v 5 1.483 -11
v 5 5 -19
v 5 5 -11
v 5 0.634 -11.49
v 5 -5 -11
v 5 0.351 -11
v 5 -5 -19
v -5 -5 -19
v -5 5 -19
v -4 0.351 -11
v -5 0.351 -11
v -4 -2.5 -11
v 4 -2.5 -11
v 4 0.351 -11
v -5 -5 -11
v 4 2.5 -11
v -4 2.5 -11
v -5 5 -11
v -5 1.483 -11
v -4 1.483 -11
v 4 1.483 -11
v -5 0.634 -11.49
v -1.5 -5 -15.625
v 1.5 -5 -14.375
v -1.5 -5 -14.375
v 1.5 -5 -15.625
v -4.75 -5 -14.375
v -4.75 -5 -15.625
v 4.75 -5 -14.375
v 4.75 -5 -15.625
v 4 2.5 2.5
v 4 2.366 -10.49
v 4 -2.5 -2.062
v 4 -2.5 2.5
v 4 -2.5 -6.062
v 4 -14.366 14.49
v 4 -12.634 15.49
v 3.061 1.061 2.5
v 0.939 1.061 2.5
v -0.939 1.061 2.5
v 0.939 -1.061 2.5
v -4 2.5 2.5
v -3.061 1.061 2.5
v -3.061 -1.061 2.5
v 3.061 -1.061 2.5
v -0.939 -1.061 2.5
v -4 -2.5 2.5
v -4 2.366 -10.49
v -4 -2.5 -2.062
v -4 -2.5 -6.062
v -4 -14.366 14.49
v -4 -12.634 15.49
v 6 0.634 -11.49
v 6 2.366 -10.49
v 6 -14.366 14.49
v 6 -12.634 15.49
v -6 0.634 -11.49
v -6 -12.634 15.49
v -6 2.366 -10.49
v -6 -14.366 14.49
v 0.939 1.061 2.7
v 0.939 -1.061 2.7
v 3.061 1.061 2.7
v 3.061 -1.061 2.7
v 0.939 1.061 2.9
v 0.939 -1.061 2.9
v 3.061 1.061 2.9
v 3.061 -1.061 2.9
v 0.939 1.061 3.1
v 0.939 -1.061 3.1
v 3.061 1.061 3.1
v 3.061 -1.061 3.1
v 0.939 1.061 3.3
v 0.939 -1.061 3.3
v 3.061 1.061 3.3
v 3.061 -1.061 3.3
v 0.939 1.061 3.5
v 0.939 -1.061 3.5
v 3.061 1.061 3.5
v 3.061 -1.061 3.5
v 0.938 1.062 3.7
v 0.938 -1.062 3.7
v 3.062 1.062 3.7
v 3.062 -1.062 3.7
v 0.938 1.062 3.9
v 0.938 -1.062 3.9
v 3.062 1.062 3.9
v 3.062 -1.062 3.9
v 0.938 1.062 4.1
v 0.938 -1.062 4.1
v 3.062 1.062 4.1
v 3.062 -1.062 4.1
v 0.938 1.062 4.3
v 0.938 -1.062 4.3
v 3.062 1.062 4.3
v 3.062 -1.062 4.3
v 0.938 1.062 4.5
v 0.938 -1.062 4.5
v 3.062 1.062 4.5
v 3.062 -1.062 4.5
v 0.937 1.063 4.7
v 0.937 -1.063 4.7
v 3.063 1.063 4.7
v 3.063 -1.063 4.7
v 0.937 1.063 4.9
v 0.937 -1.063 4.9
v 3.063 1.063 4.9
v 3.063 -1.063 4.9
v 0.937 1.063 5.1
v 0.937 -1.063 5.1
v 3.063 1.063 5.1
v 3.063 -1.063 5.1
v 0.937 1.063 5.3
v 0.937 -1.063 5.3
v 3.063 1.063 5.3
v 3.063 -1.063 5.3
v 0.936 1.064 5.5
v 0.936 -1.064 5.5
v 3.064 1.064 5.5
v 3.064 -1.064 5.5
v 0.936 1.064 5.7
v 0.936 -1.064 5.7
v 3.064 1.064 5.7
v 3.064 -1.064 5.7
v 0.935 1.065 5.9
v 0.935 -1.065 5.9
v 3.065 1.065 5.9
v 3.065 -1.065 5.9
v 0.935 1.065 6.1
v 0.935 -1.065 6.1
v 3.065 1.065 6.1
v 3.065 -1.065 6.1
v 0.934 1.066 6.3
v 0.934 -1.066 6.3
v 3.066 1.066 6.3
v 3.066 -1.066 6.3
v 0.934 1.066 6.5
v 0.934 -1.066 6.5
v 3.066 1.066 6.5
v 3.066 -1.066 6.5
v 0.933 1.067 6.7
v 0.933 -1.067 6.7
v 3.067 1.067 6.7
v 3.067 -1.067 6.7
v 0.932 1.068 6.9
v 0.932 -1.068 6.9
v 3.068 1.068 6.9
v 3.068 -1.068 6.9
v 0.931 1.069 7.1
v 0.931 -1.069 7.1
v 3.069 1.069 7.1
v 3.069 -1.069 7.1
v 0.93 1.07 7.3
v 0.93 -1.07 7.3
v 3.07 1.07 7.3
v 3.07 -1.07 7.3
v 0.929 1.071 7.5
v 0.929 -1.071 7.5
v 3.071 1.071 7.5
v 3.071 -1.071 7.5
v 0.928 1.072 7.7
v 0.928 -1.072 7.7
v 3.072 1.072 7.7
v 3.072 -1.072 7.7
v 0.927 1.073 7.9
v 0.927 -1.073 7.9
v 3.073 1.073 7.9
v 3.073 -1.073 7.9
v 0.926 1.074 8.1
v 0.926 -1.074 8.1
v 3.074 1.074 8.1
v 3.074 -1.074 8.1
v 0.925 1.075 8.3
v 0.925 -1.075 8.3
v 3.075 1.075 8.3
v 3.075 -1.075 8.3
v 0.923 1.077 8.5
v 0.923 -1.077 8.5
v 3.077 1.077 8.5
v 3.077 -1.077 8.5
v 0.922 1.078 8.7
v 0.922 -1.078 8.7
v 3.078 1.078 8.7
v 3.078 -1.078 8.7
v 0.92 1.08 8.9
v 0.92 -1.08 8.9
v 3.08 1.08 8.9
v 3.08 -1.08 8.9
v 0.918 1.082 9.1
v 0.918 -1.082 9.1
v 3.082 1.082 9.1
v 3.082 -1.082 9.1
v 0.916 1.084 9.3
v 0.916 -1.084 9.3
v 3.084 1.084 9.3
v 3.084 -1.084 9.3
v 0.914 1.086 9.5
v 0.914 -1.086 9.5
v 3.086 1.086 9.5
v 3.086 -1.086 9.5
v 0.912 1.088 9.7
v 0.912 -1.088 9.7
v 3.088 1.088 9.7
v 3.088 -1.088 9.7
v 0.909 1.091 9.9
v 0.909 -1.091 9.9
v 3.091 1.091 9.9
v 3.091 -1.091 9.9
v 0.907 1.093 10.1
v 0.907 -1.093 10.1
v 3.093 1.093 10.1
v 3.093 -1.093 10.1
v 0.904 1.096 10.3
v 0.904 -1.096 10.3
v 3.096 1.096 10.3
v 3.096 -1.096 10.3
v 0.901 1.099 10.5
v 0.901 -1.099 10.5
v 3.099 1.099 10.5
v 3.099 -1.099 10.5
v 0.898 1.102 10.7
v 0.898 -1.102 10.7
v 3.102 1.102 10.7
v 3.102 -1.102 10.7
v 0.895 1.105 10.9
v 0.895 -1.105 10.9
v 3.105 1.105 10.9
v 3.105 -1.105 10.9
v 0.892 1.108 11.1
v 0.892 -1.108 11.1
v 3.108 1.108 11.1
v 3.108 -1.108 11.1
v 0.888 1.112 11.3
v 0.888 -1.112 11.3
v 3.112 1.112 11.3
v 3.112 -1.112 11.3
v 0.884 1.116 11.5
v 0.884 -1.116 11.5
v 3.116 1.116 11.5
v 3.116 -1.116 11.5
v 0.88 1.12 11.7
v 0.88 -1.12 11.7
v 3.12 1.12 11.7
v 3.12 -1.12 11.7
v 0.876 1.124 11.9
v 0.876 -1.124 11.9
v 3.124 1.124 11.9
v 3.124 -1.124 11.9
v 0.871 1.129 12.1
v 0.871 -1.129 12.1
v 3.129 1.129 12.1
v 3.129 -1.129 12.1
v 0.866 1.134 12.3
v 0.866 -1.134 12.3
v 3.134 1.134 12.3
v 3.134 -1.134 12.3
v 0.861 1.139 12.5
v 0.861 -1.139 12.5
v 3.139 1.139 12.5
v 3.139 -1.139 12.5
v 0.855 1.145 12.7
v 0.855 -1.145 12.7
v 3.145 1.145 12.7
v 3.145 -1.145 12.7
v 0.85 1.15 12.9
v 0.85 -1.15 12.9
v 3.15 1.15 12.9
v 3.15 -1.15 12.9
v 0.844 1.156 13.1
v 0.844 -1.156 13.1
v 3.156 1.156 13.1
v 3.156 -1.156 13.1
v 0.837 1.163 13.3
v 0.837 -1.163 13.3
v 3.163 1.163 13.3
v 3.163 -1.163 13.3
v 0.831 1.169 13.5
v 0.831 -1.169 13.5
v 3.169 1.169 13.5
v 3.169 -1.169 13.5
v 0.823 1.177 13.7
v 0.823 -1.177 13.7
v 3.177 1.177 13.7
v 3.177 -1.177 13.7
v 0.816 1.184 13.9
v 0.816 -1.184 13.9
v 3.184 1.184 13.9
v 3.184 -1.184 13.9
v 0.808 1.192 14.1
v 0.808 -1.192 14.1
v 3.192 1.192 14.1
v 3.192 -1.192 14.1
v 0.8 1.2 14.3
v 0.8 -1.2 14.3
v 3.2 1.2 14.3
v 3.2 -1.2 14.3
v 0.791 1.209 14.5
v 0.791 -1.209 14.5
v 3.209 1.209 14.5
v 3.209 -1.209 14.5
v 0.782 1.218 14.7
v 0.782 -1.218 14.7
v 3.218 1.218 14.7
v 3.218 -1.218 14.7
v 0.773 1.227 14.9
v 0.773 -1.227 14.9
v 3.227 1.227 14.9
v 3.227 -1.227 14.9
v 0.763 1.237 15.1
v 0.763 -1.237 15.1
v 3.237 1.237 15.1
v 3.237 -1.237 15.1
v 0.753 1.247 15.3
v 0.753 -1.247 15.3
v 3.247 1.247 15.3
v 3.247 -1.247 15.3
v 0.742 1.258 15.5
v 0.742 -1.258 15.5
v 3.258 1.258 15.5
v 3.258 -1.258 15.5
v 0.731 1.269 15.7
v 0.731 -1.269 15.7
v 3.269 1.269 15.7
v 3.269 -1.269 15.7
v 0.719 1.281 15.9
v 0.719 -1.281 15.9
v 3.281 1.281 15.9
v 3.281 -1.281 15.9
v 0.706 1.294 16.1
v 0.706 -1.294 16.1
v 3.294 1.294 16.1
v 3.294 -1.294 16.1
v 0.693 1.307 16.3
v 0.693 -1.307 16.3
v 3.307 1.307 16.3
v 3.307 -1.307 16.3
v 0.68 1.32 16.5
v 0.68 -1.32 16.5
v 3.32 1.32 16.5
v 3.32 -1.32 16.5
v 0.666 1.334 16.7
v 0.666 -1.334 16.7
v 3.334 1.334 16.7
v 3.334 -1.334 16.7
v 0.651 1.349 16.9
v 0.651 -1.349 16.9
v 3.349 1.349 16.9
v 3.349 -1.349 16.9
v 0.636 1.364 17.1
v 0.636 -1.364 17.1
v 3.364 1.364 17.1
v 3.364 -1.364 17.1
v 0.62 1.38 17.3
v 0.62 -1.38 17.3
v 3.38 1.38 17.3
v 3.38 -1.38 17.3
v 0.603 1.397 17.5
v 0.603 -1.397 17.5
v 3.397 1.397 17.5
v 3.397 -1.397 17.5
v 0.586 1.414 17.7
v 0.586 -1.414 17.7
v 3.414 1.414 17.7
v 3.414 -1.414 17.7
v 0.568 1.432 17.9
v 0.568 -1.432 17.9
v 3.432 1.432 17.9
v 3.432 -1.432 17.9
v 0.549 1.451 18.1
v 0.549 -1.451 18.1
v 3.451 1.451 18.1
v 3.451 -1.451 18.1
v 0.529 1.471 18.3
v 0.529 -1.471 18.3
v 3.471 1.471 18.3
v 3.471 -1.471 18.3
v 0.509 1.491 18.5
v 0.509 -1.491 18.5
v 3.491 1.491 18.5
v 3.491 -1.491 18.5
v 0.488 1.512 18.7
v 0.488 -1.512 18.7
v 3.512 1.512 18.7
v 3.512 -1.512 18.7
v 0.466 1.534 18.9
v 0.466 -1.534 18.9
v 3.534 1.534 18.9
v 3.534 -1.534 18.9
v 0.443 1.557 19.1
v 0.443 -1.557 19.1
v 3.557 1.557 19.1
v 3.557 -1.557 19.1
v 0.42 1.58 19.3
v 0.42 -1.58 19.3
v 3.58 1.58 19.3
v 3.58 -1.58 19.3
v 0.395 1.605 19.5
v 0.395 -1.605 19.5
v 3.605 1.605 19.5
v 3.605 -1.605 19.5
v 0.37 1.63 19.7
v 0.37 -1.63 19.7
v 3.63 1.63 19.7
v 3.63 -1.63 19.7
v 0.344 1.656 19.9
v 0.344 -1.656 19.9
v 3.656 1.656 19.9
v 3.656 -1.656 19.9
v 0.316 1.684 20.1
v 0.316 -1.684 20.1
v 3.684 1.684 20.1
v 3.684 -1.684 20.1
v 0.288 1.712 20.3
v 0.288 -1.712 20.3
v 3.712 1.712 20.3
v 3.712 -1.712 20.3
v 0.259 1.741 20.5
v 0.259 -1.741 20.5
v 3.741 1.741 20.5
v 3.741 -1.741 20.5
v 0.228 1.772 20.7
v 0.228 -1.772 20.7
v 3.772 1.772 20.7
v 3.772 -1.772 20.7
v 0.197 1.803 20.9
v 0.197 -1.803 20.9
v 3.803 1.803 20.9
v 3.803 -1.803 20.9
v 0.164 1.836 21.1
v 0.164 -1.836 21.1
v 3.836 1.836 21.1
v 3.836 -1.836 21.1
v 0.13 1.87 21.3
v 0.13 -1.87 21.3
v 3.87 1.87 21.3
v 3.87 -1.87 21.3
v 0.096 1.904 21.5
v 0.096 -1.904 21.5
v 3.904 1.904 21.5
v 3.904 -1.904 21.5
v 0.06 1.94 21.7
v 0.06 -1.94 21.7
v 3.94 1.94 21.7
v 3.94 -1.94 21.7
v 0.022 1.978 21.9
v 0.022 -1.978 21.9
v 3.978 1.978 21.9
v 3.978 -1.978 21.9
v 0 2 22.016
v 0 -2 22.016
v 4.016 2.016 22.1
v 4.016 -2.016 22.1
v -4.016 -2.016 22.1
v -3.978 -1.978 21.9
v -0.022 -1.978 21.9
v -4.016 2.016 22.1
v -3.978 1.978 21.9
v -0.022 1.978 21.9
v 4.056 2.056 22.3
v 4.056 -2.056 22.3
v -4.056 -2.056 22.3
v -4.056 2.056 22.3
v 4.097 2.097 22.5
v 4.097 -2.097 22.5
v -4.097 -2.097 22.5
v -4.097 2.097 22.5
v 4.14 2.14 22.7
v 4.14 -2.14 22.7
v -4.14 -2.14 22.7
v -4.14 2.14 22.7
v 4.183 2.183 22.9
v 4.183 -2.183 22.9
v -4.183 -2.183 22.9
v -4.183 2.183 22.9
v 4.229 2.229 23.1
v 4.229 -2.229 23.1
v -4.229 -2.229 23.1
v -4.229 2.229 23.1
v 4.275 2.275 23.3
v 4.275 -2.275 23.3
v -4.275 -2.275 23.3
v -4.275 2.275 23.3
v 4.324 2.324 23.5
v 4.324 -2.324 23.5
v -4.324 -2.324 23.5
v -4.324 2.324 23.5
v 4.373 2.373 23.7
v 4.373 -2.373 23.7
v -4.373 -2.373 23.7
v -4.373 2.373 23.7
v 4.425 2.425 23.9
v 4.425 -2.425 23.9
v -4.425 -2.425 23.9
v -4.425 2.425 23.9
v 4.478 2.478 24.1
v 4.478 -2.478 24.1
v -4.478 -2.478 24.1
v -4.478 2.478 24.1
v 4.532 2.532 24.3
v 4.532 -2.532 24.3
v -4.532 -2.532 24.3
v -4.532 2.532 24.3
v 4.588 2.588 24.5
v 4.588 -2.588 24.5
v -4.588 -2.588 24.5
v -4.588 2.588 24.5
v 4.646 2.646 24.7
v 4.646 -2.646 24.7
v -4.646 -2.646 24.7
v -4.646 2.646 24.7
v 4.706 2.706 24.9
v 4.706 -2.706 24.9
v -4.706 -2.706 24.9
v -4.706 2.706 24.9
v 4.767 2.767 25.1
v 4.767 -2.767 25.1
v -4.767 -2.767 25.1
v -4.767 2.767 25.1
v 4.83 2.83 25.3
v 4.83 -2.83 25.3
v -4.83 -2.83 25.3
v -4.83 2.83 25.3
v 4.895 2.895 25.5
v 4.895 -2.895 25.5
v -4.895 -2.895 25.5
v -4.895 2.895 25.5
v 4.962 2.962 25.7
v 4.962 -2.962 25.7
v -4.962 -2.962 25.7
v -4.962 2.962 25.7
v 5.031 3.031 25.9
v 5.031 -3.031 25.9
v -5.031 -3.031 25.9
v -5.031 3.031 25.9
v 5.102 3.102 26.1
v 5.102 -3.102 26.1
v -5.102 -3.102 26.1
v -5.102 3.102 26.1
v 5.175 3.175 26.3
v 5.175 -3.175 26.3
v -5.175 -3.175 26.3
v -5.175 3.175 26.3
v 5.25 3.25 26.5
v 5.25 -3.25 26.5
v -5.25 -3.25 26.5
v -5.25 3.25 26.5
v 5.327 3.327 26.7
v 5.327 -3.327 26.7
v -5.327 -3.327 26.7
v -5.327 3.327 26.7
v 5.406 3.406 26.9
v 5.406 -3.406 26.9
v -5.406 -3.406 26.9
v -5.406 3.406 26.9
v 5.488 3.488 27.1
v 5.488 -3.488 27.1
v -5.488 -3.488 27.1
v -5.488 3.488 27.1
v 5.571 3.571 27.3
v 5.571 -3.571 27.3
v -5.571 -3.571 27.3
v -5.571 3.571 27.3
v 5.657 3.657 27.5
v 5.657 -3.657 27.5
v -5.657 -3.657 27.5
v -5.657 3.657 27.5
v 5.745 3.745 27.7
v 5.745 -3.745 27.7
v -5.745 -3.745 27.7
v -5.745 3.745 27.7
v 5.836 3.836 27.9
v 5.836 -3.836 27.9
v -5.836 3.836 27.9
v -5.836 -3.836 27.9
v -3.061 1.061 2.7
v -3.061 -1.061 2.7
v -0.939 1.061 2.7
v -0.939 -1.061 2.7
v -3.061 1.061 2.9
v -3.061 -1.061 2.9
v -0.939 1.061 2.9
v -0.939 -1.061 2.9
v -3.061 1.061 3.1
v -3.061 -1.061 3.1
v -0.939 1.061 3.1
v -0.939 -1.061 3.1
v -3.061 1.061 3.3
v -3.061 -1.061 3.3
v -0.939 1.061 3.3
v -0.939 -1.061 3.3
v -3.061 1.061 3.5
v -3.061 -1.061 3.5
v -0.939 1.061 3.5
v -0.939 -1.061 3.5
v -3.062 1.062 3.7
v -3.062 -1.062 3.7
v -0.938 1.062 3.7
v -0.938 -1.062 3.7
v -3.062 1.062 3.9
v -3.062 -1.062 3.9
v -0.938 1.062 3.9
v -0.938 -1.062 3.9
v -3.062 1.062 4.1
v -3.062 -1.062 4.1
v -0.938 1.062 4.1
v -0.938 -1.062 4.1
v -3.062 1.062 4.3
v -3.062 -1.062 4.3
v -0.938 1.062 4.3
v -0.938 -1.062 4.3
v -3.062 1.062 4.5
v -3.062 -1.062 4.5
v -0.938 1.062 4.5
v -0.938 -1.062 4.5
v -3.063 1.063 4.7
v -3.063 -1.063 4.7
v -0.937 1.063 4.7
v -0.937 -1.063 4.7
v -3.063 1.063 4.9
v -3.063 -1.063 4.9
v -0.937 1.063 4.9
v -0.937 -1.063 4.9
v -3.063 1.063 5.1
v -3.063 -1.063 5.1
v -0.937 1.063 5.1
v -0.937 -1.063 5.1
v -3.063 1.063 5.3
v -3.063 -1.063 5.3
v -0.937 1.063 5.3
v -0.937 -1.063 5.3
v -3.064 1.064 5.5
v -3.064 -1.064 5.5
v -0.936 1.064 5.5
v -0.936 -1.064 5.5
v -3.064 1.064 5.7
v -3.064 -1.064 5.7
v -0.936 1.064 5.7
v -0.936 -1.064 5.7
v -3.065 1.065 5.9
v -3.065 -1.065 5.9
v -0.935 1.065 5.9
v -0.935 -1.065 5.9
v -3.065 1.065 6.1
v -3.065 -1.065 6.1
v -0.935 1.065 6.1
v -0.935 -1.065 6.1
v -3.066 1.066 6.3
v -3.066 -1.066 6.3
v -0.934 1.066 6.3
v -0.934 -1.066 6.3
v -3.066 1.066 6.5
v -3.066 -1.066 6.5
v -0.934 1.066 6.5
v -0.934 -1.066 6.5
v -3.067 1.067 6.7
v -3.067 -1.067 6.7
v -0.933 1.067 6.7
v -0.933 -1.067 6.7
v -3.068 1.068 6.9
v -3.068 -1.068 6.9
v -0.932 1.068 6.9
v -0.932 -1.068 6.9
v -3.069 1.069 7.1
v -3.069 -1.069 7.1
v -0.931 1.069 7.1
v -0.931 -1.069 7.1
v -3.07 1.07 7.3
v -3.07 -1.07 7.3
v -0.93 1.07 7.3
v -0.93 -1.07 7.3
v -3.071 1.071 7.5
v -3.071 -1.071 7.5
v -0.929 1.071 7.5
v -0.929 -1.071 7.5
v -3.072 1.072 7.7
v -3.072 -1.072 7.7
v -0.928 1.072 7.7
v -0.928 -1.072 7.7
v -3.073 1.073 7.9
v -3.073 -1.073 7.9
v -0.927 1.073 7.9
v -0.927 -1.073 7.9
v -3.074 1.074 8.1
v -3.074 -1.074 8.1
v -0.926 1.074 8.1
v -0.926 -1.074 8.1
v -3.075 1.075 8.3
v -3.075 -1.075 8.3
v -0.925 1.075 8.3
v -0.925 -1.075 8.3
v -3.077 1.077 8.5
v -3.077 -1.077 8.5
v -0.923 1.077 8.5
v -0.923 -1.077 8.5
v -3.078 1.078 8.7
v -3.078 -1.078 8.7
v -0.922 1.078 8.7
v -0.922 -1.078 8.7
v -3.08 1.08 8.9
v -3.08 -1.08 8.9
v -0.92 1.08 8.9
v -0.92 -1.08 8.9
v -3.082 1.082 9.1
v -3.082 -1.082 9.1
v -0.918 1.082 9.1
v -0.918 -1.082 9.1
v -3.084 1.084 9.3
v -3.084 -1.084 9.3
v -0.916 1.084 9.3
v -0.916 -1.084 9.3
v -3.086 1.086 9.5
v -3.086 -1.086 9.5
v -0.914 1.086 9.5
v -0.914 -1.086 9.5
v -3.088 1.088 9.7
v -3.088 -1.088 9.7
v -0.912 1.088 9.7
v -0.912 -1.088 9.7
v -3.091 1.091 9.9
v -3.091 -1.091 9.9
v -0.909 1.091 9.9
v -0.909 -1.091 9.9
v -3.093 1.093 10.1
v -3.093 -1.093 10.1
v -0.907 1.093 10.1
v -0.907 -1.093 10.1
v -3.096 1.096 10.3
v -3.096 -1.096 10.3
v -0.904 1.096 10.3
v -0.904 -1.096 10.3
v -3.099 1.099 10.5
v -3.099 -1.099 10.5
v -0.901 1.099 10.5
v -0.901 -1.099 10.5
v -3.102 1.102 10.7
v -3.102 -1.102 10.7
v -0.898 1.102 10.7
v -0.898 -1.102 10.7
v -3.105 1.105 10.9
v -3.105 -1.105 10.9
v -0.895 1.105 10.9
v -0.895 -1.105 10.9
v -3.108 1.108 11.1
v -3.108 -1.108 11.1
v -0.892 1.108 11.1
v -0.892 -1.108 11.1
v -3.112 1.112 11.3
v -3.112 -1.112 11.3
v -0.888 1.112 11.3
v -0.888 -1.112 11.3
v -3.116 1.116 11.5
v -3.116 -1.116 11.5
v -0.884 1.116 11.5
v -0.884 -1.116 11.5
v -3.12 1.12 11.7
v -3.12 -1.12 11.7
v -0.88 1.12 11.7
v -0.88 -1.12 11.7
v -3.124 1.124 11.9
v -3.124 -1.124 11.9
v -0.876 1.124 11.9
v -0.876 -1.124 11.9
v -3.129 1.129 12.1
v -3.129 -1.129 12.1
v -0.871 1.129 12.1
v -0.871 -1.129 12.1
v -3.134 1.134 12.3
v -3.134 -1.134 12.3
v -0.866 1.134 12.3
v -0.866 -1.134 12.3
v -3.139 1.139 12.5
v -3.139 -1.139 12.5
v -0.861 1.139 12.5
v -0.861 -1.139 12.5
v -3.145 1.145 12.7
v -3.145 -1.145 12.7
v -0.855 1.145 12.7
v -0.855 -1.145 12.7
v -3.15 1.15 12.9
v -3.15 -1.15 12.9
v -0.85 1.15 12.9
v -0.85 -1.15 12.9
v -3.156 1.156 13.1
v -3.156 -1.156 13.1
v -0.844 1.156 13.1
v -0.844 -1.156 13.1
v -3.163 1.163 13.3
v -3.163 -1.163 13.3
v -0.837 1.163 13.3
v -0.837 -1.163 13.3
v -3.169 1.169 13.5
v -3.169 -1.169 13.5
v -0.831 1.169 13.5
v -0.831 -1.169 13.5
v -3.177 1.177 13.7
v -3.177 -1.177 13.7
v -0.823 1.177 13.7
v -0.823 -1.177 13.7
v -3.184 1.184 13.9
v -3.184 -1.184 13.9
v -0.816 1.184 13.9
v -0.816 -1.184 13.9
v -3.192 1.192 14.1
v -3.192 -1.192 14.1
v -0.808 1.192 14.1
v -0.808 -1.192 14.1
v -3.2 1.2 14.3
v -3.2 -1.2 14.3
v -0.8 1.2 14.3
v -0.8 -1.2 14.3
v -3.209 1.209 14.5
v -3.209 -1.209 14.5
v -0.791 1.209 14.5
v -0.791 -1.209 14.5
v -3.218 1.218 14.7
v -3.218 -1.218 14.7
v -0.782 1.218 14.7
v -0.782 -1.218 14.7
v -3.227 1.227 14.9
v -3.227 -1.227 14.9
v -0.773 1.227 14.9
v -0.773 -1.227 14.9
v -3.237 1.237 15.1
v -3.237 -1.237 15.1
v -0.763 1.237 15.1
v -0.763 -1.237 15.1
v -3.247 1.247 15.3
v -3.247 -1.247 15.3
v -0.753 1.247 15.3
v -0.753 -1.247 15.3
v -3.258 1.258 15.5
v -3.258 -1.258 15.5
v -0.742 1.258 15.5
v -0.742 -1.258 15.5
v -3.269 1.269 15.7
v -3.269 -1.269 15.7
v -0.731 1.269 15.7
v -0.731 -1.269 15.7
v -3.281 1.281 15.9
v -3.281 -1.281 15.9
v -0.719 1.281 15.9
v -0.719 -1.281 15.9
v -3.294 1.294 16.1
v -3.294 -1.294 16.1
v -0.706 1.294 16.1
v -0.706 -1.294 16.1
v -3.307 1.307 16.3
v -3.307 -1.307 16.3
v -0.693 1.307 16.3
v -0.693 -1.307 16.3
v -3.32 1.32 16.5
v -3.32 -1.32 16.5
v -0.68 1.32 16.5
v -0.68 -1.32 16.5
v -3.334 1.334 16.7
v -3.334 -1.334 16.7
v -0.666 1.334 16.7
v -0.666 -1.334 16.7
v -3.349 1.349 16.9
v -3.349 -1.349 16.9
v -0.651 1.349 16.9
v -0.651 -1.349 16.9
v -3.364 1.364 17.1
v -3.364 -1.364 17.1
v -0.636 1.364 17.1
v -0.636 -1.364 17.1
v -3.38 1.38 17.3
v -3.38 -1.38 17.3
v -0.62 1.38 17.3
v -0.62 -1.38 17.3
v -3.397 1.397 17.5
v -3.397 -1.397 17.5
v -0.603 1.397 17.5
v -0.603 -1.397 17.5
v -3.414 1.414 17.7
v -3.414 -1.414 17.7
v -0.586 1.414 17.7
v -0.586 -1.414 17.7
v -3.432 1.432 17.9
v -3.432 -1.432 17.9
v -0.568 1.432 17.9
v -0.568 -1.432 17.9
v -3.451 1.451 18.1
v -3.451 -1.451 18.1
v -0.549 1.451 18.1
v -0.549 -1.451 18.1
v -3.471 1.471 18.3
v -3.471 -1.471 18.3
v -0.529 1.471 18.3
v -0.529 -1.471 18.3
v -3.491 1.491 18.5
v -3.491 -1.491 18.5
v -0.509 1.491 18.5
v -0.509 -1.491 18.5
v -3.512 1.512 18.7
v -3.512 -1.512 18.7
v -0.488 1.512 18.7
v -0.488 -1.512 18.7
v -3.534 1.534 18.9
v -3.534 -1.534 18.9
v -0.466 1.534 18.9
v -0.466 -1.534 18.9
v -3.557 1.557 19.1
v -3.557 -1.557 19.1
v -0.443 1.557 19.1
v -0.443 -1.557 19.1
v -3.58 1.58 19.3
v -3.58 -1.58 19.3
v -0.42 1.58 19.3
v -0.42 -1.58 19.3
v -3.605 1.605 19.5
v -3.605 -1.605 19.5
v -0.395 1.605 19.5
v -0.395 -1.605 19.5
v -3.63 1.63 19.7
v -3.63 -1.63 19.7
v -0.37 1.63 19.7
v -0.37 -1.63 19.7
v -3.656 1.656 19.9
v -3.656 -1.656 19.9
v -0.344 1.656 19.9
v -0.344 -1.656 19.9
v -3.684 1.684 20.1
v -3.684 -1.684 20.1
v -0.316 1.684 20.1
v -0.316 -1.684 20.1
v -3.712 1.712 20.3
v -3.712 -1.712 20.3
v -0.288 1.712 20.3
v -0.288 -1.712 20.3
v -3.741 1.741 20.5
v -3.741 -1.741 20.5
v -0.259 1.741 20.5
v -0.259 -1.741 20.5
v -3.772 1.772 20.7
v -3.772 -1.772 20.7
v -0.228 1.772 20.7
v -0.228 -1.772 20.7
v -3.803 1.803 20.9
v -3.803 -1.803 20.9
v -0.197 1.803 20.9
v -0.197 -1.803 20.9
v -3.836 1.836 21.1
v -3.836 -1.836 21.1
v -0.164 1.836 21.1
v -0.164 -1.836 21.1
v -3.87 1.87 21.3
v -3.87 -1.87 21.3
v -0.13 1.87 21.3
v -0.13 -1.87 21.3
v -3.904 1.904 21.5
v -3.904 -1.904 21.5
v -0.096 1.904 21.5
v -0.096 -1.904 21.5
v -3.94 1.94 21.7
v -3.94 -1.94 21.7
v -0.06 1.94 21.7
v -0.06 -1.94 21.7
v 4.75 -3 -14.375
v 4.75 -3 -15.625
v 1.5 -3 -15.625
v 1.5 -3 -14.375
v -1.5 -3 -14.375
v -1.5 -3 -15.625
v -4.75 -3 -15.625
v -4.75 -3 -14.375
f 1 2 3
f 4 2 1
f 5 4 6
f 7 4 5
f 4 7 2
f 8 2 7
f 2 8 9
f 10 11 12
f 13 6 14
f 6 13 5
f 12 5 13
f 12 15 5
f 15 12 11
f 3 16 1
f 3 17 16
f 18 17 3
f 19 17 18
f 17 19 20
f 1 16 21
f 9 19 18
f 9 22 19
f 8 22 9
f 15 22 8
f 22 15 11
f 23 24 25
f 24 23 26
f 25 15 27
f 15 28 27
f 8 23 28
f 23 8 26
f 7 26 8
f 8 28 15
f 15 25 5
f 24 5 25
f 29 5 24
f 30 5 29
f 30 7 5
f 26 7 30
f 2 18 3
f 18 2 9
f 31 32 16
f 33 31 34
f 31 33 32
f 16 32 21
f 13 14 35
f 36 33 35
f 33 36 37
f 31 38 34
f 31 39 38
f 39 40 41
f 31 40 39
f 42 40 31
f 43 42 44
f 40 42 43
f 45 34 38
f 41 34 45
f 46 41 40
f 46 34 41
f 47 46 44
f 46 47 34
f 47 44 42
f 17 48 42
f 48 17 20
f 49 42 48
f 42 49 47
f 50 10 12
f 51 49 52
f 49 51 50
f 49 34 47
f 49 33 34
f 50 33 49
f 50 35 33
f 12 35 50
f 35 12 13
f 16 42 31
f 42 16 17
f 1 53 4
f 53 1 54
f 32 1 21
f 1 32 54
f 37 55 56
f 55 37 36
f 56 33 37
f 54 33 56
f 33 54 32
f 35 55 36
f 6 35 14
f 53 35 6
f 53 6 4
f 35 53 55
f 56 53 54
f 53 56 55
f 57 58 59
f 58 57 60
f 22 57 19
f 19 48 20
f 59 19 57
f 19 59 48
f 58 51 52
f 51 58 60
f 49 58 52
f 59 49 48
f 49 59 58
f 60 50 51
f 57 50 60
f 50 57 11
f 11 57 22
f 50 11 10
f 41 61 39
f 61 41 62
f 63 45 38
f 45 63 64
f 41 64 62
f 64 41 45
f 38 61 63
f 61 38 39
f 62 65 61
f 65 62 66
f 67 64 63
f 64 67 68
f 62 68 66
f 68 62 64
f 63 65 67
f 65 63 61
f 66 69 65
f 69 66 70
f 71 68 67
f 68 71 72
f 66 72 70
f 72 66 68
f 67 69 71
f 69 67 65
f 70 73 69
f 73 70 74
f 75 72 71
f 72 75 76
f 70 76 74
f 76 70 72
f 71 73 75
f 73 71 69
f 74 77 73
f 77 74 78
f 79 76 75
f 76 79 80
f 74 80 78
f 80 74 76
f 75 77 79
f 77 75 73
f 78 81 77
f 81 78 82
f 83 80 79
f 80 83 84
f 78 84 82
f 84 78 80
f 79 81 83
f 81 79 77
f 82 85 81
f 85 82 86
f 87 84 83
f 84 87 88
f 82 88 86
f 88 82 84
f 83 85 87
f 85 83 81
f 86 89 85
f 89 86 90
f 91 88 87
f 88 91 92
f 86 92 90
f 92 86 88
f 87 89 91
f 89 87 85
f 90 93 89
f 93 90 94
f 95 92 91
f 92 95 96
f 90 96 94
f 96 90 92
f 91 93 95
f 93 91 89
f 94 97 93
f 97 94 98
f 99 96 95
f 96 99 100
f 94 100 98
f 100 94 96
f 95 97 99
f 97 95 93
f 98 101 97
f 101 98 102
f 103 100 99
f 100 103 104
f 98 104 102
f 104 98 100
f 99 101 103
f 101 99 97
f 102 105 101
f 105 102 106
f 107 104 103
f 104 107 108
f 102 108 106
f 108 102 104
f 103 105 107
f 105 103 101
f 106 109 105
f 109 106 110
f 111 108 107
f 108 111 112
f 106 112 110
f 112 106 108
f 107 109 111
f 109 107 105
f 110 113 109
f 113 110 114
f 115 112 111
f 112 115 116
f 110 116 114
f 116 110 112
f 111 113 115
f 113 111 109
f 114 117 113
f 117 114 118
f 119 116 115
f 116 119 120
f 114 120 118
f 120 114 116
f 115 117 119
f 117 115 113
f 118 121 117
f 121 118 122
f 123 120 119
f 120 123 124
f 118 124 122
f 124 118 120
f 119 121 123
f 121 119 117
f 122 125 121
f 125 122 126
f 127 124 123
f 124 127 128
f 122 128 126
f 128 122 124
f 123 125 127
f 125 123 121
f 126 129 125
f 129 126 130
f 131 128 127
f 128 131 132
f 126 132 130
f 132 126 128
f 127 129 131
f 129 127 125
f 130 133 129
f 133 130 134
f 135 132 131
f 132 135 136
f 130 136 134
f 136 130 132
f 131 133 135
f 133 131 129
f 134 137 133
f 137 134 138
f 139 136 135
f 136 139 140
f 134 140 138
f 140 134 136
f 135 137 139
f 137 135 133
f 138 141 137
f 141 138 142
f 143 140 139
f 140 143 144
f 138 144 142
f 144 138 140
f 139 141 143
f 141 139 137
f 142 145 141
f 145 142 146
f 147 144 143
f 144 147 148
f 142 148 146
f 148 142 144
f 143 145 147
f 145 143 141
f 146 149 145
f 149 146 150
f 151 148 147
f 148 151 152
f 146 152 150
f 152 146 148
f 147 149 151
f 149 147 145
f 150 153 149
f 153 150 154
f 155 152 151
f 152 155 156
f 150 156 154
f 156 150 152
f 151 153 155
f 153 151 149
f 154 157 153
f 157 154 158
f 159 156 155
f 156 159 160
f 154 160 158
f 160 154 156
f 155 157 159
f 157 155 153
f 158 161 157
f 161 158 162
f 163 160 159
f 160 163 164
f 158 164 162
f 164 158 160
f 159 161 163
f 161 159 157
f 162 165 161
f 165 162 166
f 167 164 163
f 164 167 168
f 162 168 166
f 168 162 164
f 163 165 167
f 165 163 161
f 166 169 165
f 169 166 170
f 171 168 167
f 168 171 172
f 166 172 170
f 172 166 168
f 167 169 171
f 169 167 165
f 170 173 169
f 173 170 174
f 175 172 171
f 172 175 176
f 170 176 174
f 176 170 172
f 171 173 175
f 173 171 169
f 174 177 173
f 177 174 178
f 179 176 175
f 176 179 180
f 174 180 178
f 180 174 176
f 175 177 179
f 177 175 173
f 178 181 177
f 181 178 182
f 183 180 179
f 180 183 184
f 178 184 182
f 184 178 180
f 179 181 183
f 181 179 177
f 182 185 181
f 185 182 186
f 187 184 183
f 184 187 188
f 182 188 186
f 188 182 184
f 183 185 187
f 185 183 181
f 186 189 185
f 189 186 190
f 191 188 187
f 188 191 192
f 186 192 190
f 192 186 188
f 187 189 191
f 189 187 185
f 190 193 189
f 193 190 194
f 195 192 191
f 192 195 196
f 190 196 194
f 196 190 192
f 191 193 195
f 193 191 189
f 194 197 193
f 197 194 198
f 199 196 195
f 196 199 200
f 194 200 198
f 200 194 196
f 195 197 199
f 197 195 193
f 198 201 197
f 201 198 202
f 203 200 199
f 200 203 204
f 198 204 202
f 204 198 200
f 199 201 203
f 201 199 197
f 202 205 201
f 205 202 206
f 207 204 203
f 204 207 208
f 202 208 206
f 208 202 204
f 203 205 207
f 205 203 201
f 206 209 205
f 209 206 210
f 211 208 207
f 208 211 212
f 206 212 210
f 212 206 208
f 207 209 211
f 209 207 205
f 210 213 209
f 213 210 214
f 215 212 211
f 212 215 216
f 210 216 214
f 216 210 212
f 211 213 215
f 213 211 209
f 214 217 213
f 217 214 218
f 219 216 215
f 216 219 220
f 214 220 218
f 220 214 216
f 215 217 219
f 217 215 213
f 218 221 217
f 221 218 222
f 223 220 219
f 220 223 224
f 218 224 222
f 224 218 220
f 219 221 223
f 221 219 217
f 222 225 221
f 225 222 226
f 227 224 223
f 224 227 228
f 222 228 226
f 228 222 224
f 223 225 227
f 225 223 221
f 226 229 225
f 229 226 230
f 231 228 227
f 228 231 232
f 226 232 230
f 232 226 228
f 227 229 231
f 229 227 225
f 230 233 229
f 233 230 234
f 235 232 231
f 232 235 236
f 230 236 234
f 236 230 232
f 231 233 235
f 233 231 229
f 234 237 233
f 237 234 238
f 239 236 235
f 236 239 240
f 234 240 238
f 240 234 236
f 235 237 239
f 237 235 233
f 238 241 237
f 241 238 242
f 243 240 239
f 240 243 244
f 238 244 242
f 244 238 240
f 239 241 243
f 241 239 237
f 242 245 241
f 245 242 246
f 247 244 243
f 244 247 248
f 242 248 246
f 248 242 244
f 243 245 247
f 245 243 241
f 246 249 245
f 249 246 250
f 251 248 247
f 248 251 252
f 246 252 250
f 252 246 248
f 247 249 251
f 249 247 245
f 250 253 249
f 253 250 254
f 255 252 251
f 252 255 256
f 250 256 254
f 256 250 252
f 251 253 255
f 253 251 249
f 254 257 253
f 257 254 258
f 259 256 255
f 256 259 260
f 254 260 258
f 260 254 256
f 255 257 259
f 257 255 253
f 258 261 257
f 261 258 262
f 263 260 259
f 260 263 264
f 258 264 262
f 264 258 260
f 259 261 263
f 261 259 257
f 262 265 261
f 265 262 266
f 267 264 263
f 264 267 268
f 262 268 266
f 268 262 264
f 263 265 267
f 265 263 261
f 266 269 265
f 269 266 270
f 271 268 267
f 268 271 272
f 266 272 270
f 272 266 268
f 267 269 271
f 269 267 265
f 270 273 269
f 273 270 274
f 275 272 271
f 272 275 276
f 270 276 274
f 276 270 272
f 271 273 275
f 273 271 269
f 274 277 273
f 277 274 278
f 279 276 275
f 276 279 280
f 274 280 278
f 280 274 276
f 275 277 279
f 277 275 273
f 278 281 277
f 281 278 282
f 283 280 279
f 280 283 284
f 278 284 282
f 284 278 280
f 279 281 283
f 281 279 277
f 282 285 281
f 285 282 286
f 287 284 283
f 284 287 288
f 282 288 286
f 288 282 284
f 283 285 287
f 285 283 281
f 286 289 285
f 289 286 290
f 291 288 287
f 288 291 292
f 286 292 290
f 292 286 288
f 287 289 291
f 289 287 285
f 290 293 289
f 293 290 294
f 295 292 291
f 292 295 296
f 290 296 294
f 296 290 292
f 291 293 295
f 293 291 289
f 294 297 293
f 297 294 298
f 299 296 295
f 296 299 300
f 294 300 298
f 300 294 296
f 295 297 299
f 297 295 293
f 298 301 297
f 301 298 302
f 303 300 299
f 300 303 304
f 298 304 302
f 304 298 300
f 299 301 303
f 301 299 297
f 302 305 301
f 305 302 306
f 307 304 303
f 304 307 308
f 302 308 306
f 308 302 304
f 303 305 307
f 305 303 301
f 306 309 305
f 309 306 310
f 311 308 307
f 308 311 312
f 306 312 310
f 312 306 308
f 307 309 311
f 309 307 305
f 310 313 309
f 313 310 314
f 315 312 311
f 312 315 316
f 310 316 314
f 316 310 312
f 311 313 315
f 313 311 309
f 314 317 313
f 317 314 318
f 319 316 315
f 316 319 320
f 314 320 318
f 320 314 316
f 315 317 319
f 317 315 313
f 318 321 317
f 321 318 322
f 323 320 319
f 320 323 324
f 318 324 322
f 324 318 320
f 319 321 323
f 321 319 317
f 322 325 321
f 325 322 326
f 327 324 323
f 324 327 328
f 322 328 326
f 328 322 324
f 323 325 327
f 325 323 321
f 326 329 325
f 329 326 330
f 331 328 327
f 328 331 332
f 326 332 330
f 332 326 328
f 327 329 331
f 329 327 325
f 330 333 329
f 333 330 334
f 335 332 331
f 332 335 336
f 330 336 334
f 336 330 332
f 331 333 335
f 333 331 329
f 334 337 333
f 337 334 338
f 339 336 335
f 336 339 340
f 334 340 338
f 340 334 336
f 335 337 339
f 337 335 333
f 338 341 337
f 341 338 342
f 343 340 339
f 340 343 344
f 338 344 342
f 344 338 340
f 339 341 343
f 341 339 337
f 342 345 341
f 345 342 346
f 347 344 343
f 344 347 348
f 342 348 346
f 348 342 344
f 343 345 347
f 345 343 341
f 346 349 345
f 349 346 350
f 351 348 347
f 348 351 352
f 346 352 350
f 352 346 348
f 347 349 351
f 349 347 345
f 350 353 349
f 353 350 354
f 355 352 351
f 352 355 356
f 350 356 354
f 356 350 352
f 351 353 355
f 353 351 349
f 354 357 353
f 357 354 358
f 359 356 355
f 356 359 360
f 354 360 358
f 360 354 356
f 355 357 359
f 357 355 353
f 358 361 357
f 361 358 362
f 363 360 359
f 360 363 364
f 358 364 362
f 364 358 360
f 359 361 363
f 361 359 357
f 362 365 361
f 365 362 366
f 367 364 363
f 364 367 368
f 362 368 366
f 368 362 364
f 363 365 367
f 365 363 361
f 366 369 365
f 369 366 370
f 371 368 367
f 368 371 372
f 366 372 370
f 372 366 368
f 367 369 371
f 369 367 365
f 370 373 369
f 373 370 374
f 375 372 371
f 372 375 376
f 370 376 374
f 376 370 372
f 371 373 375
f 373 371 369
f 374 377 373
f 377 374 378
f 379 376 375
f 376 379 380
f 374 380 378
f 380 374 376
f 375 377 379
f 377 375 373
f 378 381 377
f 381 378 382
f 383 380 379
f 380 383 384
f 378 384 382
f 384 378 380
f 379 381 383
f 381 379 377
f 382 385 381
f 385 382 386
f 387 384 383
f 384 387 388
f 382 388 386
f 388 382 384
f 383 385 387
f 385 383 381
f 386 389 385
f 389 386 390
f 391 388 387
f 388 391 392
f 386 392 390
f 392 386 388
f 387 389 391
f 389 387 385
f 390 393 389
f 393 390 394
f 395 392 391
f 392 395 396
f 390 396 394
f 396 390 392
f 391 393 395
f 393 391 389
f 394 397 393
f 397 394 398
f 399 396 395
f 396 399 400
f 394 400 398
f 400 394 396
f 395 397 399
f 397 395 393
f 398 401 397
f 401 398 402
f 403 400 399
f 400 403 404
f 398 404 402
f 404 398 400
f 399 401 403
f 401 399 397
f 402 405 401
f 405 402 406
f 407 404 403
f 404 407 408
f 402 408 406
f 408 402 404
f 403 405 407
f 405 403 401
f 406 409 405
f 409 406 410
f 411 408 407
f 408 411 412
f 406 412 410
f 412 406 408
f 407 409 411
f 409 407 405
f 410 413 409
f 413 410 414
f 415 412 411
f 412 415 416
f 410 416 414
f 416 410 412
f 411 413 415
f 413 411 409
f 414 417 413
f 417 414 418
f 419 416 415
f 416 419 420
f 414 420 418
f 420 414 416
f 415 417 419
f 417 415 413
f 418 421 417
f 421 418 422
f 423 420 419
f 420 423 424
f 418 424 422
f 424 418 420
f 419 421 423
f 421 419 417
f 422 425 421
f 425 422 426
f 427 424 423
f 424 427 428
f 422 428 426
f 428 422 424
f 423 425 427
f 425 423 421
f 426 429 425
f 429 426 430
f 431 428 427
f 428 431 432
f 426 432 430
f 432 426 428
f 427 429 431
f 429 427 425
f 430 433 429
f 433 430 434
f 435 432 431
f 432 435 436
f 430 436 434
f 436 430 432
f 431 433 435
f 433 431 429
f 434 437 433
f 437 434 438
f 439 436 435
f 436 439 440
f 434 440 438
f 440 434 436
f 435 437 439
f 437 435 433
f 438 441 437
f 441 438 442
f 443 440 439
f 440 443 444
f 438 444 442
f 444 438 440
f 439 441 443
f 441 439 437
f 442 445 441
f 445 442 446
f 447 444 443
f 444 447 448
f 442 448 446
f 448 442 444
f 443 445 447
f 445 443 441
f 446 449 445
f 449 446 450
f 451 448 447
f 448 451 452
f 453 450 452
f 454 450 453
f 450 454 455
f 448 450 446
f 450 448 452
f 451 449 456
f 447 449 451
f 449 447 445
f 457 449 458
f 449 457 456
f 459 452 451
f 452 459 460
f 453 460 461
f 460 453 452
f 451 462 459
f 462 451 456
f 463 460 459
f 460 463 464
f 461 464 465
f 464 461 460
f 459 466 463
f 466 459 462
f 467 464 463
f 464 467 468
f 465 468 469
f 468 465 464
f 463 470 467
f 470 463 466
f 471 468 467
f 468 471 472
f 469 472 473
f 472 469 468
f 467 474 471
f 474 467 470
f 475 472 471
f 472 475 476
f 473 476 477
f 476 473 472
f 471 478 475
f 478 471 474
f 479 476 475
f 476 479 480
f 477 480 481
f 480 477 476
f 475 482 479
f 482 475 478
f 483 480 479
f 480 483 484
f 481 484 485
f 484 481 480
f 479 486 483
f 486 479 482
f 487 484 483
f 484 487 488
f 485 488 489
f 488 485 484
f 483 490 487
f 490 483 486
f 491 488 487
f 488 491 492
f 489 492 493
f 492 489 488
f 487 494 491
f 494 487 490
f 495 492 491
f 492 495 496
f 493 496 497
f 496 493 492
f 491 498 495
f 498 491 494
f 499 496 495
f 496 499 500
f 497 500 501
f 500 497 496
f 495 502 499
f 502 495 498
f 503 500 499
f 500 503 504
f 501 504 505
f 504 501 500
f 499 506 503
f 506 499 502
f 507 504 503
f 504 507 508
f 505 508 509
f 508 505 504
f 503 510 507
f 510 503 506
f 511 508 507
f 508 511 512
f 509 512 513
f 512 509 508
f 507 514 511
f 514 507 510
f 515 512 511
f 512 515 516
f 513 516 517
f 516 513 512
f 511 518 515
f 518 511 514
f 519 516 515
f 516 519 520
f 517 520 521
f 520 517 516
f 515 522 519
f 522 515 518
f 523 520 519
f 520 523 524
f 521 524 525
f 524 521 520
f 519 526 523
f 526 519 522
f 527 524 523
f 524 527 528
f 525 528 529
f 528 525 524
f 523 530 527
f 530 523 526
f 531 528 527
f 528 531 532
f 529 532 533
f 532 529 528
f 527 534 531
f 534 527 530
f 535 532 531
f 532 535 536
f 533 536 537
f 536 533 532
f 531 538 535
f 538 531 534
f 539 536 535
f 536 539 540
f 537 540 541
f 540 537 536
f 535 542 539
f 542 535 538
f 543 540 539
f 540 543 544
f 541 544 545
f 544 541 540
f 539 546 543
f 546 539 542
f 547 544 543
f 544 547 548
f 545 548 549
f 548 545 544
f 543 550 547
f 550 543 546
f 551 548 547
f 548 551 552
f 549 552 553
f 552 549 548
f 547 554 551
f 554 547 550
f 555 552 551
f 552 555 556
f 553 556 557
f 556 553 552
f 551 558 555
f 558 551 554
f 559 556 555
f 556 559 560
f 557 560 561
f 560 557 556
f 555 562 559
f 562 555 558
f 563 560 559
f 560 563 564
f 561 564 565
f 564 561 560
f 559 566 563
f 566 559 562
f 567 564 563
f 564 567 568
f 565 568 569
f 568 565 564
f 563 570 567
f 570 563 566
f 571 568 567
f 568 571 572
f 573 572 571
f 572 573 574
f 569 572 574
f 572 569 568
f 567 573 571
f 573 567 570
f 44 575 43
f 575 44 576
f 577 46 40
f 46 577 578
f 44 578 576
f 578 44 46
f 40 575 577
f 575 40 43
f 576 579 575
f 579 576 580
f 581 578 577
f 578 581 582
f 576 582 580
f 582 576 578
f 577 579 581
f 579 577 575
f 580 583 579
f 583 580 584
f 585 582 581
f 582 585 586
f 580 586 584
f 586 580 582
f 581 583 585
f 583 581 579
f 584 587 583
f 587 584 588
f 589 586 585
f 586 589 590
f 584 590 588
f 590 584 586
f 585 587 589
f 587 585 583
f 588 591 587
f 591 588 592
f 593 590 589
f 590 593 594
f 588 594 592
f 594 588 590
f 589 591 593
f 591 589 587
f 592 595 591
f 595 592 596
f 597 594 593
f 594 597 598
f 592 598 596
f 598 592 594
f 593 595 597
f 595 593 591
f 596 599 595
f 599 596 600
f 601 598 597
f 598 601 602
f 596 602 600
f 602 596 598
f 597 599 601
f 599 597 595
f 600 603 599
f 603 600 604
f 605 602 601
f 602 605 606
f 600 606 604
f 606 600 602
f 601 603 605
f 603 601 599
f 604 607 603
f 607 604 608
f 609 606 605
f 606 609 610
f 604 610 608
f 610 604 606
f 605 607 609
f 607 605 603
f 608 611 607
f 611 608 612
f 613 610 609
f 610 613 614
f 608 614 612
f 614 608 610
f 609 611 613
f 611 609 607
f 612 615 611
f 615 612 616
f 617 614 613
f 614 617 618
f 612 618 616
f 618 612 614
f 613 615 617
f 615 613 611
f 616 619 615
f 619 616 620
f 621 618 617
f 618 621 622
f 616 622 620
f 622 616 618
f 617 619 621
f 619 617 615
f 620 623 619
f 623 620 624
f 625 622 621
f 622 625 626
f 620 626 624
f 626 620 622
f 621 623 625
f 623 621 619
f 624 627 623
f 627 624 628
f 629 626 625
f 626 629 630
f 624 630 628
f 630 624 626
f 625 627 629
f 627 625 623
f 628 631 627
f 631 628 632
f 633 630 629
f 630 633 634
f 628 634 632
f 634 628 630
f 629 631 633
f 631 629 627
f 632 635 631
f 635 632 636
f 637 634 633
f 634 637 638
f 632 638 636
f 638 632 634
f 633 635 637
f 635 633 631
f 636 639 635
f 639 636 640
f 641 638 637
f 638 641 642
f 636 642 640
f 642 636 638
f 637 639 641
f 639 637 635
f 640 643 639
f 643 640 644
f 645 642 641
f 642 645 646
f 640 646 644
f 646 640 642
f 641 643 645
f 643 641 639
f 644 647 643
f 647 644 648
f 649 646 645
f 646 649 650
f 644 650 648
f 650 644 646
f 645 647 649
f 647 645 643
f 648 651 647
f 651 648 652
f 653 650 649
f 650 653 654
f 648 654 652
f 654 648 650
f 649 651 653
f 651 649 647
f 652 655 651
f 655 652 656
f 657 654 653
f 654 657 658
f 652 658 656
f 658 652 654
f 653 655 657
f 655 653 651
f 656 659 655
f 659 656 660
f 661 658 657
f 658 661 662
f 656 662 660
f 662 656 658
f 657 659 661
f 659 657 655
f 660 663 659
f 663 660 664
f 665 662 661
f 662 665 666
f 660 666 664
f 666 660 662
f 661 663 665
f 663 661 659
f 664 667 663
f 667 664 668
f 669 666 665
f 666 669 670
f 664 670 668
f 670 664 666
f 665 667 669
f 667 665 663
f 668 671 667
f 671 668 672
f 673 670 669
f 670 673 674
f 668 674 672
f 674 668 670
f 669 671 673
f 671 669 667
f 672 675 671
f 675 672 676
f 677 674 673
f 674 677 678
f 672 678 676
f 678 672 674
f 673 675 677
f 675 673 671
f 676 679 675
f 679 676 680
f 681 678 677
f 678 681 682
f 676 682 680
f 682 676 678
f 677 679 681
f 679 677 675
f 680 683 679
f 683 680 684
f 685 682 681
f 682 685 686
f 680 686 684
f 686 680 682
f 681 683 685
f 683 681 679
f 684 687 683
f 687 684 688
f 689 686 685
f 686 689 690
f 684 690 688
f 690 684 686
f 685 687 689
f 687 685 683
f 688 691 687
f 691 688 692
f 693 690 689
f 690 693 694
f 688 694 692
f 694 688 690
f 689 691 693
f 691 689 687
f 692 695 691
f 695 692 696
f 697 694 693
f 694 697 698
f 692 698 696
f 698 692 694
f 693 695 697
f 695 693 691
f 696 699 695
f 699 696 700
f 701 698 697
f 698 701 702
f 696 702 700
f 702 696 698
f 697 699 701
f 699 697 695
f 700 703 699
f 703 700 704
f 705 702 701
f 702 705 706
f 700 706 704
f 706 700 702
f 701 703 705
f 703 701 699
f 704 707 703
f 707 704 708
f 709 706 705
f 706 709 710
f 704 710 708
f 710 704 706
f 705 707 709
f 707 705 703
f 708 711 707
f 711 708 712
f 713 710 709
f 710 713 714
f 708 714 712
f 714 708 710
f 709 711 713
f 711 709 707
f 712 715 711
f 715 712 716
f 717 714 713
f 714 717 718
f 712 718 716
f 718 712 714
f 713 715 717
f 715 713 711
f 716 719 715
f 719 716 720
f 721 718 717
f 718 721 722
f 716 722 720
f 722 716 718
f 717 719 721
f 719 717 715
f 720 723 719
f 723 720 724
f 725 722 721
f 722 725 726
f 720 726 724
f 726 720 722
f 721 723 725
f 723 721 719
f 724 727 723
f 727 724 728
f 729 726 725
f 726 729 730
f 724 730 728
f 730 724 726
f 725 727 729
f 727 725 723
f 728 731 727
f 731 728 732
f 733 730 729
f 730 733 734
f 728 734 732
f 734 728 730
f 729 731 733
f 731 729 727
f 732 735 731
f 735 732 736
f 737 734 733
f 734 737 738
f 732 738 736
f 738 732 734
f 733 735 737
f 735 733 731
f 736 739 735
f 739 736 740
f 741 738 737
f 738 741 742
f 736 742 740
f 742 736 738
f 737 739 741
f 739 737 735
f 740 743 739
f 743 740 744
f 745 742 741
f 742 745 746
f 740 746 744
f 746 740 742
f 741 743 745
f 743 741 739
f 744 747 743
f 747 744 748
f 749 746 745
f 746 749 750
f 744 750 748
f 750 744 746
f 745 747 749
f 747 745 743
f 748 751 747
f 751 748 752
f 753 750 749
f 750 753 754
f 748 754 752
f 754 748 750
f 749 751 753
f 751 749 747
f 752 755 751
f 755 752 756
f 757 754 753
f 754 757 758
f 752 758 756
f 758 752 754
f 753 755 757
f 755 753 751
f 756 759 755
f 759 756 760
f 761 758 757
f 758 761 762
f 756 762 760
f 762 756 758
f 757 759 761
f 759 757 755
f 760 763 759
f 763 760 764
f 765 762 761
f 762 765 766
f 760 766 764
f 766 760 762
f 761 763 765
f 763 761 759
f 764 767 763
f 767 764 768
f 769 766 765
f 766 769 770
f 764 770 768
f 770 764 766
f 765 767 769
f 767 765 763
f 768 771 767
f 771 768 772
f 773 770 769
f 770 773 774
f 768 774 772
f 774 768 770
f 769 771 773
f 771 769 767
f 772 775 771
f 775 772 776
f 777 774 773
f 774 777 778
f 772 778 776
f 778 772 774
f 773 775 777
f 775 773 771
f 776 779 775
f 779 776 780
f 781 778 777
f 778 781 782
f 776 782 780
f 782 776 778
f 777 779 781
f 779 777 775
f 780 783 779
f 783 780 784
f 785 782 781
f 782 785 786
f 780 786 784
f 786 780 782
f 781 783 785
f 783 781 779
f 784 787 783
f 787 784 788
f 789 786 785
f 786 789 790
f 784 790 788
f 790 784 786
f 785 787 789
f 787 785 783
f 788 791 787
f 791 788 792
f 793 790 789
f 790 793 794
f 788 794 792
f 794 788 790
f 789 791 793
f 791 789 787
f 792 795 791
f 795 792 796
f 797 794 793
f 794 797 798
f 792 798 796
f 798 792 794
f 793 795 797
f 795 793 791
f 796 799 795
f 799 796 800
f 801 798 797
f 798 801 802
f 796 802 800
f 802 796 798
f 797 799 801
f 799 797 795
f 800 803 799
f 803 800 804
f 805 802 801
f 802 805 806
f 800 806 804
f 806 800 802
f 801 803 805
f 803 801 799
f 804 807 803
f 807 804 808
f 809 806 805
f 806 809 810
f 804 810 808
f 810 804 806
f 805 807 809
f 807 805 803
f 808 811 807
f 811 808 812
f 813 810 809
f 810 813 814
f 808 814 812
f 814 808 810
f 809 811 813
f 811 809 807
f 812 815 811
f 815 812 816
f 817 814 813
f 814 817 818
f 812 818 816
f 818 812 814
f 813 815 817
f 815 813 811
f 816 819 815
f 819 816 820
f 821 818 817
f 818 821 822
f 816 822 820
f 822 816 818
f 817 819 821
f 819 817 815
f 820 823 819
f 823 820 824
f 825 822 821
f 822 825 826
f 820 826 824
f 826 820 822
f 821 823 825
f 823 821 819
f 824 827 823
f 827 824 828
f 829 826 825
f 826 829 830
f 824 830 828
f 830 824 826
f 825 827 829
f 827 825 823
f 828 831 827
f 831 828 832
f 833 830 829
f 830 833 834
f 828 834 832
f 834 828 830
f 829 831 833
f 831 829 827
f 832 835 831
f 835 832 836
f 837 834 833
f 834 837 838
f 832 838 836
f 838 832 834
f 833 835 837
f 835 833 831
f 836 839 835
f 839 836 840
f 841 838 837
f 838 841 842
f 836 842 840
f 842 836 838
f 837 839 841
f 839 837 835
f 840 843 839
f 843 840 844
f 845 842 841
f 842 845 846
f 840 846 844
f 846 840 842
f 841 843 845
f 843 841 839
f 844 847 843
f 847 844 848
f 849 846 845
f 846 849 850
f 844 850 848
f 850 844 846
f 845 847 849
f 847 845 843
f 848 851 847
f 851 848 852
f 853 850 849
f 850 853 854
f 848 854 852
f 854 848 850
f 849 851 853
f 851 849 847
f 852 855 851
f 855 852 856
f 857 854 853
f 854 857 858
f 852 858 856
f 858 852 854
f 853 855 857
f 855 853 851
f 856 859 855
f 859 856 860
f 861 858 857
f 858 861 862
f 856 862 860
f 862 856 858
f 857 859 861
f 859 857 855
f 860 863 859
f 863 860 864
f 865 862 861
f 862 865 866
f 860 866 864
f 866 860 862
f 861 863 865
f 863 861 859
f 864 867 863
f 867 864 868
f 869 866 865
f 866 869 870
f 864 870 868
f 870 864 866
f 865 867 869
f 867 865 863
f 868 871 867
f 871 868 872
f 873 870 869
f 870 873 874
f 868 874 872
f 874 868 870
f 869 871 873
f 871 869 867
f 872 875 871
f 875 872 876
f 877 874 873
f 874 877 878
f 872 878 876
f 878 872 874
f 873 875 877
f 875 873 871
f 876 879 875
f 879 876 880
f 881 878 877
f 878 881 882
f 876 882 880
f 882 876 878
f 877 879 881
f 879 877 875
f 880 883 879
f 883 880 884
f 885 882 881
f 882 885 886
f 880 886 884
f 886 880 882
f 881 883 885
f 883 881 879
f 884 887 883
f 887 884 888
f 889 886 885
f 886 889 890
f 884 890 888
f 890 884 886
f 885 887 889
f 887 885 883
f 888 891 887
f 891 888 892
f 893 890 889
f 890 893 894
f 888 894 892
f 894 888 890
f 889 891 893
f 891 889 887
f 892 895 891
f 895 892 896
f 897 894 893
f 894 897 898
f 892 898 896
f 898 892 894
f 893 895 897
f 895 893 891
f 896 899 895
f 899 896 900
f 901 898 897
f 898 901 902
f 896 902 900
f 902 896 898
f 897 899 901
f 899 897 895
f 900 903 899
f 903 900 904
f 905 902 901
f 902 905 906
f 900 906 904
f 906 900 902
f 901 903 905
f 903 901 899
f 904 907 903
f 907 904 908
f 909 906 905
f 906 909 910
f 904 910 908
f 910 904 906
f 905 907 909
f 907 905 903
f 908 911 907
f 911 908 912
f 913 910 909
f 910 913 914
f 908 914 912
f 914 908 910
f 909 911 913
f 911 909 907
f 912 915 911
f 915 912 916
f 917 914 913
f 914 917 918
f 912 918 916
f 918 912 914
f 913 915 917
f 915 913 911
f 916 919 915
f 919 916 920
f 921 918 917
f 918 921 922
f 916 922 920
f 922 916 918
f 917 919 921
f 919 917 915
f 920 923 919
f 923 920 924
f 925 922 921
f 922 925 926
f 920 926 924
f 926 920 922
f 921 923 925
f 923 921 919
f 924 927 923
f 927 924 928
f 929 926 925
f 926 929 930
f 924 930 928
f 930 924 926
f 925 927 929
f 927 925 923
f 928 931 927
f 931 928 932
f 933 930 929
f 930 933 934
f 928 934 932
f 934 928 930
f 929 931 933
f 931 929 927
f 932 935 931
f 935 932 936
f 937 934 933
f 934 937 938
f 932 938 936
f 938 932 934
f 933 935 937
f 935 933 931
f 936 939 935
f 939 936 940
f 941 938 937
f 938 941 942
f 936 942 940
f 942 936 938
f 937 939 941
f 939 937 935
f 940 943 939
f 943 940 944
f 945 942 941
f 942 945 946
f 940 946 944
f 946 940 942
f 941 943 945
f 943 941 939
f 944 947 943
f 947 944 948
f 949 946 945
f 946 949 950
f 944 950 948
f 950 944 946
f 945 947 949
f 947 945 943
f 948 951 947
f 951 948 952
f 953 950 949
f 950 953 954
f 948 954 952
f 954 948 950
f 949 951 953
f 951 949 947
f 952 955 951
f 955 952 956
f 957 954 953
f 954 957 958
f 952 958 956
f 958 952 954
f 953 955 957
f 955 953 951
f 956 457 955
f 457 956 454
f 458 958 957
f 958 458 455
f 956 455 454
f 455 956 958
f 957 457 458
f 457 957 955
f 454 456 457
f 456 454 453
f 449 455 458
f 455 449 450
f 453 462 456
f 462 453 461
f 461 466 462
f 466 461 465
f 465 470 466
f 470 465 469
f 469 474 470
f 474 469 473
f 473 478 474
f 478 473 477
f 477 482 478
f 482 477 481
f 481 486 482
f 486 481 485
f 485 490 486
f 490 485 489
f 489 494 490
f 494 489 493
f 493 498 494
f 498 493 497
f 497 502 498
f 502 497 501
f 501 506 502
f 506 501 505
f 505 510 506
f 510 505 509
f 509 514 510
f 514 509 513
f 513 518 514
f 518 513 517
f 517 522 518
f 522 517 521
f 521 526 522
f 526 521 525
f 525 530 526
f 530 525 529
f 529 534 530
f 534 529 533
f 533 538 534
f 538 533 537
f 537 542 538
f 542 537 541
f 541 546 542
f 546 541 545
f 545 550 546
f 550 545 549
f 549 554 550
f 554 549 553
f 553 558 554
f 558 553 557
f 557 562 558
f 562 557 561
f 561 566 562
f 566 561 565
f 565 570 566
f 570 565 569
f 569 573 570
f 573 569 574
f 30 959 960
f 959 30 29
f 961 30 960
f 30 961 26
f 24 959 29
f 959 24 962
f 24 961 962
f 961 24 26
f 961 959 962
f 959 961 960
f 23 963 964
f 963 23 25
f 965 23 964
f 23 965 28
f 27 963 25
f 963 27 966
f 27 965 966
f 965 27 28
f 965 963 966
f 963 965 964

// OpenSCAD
head=10;
ancho=6*head/10;
miniancho=2*head/10;

scub=0.8;

//module for legs (2nd grade)
module parab_leg(altura,lrate,first,iter) {
	for(i=[1:iter])
		{translate([0,0,(i-1)*altura]) cylinder(h=altura,r1=lrate*i*i+first,r2=lrate*(i+1)*(i+1)+first,center=true,$fn=4);}
}

//module for legs (3rd grade)
module parab3_leg(altura,lrate,first,iter) {
	for(i=[1:iter])
		{translate([0,0,(i-1)*altura]) cylinder(h=altura,r1=lrate*i*i*i+first,r2=lrate*(i+1)*(i+1)*(i+1)+first,center=true,$fn=4);}
}

//module for legs (4th grade)
module parab4_leg(altura,lrate,first,iter) {
	for(i=[1:iter])
		{translate([0,0,(i-1)*altura]) cylinder(h=altura,r1=lrate*i*i*i*i+first,r2=lrate*(i+1)*(i+1)*(i+1)*(i+1)+first,center=true,$fn=4);}
}

//module for legs (5th grade)
module parab5_leg(altura,lrate,first,iter) {
	for(i=[1:iter])
		{translate([0,0,(i-1)*altura]) cylinder(h=altura,r1=lrate*i*i*i*i*i+first,r2=lrate*(i+1)*(i+1)*(i+1)*(i+1)*(i+1)+first,center=true,$fn=4);}
}


//calibration cube to hold. Uncomment for amusement
//rotate([0,90,0])
//translate([-10,-10,0])
//cube([20*scub,20*scub,10*scub],center=true);

rotate([180,0,0])
color("Indigo")
difference(){
	union() {
		union() {
			union() {
					//head	
					translate([0,0,3*head/2])
					cube([head,head,head*0.8],center=true);
	
					//body
					translate([0,0,5])
					cube([head*0.8,0.5*head,3*head/2],center=true);
					}
						//arms
						translate([head*0.5,head*0.6,-head*0.2])
						rotate([30,0,0])	
						cube([miniancho,miniancho,2.5*head+5],center=true);
						
						translate([-head*0.5,head*0.6,-head*0.2])
						rotate([30,0,0])
						cube([miniancho,miniancho,2.5*head+5],center=true);
	
				}
			//legs
			translate([head*0.2,0,head*0.2])
			rotate([180,0,45])
			parab5_leg(0.2,0.00000000005,1.5,150);
	
			translate([-head*0.2,0,head*0.2])
			rotate([180,0,45])
			parab5_leg(0.2,0.00000000005,1.5,150);
			}

	//eyes
	translate([5*head/16,head*0.8,1.5*head])
	cube([2.6*head/8,head,head/8],center=true);

	translate([-5*head/16,head*0.8,1.5*head])
	cube([2.6*head/8,head,head/8],center=true);
	}
